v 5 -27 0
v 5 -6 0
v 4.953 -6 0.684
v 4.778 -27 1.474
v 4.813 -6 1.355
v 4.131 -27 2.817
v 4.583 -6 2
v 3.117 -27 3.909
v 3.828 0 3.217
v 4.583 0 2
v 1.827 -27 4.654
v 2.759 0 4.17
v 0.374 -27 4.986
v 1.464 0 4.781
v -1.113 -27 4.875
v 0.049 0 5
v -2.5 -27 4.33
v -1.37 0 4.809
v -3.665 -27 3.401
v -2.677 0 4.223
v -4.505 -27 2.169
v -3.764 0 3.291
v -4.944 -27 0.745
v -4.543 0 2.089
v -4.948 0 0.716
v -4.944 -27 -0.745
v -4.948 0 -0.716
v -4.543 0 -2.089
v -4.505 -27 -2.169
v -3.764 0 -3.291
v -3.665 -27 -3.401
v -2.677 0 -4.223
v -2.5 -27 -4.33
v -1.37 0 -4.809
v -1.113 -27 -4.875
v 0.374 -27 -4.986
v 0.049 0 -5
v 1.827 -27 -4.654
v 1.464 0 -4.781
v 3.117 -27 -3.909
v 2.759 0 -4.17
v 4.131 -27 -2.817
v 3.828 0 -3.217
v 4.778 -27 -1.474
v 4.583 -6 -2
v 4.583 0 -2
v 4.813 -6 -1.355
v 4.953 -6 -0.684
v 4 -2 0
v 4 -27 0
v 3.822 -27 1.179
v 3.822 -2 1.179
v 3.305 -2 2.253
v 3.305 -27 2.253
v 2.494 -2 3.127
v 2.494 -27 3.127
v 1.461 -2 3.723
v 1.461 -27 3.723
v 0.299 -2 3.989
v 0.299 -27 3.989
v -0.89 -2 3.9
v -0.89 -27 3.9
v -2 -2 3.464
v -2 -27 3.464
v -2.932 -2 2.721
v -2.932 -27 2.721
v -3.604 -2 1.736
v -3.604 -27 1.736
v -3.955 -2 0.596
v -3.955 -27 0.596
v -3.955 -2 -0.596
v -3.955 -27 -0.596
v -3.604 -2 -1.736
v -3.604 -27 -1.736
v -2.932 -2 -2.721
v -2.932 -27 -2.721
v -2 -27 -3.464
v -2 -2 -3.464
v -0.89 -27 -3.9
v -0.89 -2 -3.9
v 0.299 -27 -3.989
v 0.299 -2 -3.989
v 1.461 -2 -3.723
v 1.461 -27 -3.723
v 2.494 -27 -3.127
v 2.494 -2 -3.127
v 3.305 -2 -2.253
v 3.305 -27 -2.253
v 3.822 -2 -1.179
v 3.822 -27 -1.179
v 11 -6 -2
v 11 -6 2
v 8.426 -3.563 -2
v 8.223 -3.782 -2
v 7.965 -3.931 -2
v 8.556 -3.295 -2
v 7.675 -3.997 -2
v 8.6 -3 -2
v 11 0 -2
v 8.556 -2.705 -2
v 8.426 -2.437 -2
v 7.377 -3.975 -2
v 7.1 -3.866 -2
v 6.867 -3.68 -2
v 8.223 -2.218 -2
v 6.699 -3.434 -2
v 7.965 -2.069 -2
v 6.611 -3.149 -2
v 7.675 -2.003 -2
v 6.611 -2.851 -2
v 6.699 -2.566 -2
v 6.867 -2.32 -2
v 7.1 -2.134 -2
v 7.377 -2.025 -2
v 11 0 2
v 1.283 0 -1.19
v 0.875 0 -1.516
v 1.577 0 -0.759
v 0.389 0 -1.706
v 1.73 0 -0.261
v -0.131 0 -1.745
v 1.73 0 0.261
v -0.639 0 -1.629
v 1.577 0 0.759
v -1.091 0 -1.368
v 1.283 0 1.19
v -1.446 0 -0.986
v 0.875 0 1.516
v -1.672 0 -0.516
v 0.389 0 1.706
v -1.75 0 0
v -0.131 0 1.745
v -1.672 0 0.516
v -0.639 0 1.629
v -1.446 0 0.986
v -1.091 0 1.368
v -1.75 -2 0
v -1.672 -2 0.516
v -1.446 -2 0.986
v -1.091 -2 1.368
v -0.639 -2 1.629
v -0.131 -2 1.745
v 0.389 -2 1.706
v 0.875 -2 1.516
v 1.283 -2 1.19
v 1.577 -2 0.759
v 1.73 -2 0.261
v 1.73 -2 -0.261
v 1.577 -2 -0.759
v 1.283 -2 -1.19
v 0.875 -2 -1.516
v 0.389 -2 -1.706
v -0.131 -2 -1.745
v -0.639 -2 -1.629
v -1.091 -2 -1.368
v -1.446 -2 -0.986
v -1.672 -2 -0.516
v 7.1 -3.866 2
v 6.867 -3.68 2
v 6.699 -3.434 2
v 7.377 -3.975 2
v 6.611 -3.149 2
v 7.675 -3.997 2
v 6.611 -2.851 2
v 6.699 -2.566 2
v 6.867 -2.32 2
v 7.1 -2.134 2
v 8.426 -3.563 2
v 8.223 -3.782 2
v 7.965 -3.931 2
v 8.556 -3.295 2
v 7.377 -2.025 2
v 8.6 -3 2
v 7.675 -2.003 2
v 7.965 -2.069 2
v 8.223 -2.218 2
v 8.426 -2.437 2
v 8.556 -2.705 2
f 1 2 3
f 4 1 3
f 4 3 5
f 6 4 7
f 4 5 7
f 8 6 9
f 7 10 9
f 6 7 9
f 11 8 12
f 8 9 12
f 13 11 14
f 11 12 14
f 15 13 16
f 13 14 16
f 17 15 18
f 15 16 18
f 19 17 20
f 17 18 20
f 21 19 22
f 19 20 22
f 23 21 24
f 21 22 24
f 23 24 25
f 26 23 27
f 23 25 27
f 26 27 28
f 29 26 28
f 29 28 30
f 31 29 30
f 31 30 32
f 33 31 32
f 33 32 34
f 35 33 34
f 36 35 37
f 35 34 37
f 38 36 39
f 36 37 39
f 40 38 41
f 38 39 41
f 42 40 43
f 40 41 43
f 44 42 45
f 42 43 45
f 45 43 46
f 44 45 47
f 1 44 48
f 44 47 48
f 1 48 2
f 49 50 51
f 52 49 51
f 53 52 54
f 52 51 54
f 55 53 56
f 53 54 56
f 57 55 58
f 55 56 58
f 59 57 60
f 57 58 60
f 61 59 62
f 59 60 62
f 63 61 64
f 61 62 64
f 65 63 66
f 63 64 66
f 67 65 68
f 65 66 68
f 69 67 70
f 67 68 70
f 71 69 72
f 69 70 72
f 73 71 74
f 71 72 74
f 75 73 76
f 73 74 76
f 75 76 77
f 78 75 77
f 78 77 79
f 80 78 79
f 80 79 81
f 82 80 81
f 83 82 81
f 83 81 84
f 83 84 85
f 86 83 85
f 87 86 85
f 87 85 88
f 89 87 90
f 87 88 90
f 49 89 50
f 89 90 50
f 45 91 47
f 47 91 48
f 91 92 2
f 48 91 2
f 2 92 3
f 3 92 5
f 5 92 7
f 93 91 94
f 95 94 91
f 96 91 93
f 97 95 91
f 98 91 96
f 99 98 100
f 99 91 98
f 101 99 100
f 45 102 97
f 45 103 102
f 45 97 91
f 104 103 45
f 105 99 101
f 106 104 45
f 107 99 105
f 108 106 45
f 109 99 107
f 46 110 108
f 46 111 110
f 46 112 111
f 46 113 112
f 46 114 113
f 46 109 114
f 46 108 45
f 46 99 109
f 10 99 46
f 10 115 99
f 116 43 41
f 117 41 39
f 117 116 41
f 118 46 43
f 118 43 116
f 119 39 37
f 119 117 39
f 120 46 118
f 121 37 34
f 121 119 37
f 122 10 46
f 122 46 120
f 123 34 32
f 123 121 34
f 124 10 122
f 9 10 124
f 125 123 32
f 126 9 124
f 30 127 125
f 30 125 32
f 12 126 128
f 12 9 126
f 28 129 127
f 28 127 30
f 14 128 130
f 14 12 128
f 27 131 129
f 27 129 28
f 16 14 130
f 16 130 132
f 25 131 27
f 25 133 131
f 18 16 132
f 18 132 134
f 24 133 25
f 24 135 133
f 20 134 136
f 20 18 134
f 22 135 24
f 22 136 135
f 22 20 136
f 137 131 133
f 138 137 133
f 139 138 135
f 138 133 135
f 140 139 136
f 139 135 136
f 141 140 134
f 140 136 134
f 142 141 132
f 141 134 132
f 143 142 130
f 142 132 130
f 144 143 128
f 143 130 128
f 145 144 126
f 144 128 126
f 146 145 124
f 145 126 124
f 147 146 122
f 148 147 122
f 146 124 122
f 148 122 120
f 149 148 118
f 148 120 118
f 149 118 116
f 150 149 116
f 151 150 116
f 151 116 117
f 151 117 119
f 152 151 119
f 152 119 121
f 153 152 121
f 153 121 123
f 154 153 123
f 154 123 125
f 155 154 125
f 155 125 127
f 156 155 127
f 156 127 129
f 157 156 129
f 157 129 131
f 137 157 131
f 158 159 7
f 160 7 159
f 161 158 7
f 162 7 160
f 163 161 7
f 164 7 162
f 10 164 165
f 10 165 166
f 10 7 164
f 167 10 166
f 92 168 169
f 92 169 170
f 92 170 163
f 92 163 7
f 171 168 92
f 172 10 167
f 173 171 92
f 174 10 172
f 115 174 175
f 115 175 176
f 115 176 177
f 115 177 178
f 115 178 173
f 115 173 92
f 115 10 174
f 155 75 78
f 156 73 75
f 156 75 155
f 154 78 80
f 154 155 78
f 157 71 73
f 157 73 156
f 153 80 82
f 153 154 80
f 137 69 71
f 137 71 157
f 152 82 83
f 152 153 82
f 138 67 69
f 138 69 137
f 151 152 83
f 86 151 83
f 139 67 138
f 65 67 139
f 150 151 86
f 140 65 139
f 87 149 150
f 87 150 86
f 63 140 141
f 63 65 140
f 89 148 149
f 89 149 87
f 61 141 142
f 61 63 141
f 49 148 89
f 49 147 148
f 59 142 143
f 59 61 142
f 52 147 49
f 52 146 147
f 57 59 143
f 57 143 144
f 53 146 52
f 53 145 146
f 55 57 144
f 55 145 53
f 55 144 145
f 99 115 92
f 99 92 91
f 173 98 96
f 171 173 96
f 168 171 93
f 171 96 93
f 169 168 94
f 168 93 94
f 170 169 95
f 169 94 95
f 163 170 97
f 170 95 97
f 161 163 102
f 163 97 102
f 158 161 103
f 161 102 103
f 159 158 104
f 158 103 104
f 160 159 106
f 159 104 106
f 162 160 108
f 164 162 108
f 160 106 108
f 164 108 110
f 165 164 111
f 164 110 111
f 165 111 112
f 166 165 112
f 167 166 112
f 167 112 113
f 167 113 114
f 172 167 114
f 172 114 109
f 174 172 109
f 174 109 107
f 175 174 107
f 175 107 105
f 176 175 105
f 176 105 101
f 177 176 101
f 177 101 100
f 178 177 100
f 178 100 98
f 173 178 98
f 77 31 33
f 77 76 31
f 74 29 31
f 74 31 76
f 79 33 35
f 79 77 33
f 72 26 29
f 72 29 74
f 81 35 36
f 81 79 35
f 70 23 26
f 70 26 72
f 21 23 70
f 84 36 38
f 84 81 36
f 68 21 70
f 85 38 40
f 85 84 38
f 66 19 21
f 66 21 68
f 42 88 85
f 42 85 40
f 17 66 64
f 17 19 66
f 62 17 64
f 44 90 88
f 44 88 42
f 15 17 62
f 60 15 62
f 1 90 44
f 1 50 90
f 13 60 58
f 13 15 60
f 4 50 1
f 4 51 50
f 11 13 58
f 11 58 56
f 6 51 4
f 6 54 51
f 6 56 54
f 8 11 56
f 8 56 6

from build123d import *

# Parameters (mm, degrees)
F0_R     = 5
F1_DEPTH = 27
F2_R     = 4
F3_DEPTH = 25
F4_R     = 1.75
F5_DEPTH = 25
F7_DEPTH = 6
F8_R     = 1
F9_DEPTH = 25


with BuildPart() as f1:
    # F0 (on Front) → F1 (new body)
    with BuildSketch(Plane.XZ):
        Circle(F0_R)
    extrude(amount=F1_DEPTH)

    # F2 (on face) → F3 (cut)
    with BuildSketch(Plane.XZ.offset(27)):
        Circle(F2_R)
    extrude(amount=-F3_DEPTH, mode=Mode.SUBTRACT)

    # F4 (on face) → F5 (cut)
    with BuildSketch(Plane(origin=(0, 0, 0), x_dir=(-1, 0, 0), z_dir=(0, 1, 0))):
        Circle(F4_R)
    extrude(amount=-F5_DEPTH, mode=Mode.SUBTRACT)

    # F6 (on face) → F7 (join)
    with BuildSketch(Plane(origin=(0, 0, 0), x_dir=(-1, 0, 0), z_dir=(0, 1, 0))):
        with BuildLine():
            Line((-11, -2), (-4.582575695, -2))
            ThreePointArc((-4.582575695, -2), (-5, 0), (-4.582575695, 2))
            Line((-4.582575695, 2), (-11, 2))
            Line((-11, 2), (-11, -2))
        make_face()
    extrude(amount=-F7_DEPTH)

    # F8 (on face) → F9 (cut)
    with BuildSketch(Plane(origin=(0, 0, -2), x_dir=(1, 0, 0), z_dir=(0, 0, -1))):
        with Locations((7.6, 3)):
            Circle(F8_R)
    extrude(amount=-F9_DEPTH, mode=Mode.SUBTRACT)


solid = f1.part
